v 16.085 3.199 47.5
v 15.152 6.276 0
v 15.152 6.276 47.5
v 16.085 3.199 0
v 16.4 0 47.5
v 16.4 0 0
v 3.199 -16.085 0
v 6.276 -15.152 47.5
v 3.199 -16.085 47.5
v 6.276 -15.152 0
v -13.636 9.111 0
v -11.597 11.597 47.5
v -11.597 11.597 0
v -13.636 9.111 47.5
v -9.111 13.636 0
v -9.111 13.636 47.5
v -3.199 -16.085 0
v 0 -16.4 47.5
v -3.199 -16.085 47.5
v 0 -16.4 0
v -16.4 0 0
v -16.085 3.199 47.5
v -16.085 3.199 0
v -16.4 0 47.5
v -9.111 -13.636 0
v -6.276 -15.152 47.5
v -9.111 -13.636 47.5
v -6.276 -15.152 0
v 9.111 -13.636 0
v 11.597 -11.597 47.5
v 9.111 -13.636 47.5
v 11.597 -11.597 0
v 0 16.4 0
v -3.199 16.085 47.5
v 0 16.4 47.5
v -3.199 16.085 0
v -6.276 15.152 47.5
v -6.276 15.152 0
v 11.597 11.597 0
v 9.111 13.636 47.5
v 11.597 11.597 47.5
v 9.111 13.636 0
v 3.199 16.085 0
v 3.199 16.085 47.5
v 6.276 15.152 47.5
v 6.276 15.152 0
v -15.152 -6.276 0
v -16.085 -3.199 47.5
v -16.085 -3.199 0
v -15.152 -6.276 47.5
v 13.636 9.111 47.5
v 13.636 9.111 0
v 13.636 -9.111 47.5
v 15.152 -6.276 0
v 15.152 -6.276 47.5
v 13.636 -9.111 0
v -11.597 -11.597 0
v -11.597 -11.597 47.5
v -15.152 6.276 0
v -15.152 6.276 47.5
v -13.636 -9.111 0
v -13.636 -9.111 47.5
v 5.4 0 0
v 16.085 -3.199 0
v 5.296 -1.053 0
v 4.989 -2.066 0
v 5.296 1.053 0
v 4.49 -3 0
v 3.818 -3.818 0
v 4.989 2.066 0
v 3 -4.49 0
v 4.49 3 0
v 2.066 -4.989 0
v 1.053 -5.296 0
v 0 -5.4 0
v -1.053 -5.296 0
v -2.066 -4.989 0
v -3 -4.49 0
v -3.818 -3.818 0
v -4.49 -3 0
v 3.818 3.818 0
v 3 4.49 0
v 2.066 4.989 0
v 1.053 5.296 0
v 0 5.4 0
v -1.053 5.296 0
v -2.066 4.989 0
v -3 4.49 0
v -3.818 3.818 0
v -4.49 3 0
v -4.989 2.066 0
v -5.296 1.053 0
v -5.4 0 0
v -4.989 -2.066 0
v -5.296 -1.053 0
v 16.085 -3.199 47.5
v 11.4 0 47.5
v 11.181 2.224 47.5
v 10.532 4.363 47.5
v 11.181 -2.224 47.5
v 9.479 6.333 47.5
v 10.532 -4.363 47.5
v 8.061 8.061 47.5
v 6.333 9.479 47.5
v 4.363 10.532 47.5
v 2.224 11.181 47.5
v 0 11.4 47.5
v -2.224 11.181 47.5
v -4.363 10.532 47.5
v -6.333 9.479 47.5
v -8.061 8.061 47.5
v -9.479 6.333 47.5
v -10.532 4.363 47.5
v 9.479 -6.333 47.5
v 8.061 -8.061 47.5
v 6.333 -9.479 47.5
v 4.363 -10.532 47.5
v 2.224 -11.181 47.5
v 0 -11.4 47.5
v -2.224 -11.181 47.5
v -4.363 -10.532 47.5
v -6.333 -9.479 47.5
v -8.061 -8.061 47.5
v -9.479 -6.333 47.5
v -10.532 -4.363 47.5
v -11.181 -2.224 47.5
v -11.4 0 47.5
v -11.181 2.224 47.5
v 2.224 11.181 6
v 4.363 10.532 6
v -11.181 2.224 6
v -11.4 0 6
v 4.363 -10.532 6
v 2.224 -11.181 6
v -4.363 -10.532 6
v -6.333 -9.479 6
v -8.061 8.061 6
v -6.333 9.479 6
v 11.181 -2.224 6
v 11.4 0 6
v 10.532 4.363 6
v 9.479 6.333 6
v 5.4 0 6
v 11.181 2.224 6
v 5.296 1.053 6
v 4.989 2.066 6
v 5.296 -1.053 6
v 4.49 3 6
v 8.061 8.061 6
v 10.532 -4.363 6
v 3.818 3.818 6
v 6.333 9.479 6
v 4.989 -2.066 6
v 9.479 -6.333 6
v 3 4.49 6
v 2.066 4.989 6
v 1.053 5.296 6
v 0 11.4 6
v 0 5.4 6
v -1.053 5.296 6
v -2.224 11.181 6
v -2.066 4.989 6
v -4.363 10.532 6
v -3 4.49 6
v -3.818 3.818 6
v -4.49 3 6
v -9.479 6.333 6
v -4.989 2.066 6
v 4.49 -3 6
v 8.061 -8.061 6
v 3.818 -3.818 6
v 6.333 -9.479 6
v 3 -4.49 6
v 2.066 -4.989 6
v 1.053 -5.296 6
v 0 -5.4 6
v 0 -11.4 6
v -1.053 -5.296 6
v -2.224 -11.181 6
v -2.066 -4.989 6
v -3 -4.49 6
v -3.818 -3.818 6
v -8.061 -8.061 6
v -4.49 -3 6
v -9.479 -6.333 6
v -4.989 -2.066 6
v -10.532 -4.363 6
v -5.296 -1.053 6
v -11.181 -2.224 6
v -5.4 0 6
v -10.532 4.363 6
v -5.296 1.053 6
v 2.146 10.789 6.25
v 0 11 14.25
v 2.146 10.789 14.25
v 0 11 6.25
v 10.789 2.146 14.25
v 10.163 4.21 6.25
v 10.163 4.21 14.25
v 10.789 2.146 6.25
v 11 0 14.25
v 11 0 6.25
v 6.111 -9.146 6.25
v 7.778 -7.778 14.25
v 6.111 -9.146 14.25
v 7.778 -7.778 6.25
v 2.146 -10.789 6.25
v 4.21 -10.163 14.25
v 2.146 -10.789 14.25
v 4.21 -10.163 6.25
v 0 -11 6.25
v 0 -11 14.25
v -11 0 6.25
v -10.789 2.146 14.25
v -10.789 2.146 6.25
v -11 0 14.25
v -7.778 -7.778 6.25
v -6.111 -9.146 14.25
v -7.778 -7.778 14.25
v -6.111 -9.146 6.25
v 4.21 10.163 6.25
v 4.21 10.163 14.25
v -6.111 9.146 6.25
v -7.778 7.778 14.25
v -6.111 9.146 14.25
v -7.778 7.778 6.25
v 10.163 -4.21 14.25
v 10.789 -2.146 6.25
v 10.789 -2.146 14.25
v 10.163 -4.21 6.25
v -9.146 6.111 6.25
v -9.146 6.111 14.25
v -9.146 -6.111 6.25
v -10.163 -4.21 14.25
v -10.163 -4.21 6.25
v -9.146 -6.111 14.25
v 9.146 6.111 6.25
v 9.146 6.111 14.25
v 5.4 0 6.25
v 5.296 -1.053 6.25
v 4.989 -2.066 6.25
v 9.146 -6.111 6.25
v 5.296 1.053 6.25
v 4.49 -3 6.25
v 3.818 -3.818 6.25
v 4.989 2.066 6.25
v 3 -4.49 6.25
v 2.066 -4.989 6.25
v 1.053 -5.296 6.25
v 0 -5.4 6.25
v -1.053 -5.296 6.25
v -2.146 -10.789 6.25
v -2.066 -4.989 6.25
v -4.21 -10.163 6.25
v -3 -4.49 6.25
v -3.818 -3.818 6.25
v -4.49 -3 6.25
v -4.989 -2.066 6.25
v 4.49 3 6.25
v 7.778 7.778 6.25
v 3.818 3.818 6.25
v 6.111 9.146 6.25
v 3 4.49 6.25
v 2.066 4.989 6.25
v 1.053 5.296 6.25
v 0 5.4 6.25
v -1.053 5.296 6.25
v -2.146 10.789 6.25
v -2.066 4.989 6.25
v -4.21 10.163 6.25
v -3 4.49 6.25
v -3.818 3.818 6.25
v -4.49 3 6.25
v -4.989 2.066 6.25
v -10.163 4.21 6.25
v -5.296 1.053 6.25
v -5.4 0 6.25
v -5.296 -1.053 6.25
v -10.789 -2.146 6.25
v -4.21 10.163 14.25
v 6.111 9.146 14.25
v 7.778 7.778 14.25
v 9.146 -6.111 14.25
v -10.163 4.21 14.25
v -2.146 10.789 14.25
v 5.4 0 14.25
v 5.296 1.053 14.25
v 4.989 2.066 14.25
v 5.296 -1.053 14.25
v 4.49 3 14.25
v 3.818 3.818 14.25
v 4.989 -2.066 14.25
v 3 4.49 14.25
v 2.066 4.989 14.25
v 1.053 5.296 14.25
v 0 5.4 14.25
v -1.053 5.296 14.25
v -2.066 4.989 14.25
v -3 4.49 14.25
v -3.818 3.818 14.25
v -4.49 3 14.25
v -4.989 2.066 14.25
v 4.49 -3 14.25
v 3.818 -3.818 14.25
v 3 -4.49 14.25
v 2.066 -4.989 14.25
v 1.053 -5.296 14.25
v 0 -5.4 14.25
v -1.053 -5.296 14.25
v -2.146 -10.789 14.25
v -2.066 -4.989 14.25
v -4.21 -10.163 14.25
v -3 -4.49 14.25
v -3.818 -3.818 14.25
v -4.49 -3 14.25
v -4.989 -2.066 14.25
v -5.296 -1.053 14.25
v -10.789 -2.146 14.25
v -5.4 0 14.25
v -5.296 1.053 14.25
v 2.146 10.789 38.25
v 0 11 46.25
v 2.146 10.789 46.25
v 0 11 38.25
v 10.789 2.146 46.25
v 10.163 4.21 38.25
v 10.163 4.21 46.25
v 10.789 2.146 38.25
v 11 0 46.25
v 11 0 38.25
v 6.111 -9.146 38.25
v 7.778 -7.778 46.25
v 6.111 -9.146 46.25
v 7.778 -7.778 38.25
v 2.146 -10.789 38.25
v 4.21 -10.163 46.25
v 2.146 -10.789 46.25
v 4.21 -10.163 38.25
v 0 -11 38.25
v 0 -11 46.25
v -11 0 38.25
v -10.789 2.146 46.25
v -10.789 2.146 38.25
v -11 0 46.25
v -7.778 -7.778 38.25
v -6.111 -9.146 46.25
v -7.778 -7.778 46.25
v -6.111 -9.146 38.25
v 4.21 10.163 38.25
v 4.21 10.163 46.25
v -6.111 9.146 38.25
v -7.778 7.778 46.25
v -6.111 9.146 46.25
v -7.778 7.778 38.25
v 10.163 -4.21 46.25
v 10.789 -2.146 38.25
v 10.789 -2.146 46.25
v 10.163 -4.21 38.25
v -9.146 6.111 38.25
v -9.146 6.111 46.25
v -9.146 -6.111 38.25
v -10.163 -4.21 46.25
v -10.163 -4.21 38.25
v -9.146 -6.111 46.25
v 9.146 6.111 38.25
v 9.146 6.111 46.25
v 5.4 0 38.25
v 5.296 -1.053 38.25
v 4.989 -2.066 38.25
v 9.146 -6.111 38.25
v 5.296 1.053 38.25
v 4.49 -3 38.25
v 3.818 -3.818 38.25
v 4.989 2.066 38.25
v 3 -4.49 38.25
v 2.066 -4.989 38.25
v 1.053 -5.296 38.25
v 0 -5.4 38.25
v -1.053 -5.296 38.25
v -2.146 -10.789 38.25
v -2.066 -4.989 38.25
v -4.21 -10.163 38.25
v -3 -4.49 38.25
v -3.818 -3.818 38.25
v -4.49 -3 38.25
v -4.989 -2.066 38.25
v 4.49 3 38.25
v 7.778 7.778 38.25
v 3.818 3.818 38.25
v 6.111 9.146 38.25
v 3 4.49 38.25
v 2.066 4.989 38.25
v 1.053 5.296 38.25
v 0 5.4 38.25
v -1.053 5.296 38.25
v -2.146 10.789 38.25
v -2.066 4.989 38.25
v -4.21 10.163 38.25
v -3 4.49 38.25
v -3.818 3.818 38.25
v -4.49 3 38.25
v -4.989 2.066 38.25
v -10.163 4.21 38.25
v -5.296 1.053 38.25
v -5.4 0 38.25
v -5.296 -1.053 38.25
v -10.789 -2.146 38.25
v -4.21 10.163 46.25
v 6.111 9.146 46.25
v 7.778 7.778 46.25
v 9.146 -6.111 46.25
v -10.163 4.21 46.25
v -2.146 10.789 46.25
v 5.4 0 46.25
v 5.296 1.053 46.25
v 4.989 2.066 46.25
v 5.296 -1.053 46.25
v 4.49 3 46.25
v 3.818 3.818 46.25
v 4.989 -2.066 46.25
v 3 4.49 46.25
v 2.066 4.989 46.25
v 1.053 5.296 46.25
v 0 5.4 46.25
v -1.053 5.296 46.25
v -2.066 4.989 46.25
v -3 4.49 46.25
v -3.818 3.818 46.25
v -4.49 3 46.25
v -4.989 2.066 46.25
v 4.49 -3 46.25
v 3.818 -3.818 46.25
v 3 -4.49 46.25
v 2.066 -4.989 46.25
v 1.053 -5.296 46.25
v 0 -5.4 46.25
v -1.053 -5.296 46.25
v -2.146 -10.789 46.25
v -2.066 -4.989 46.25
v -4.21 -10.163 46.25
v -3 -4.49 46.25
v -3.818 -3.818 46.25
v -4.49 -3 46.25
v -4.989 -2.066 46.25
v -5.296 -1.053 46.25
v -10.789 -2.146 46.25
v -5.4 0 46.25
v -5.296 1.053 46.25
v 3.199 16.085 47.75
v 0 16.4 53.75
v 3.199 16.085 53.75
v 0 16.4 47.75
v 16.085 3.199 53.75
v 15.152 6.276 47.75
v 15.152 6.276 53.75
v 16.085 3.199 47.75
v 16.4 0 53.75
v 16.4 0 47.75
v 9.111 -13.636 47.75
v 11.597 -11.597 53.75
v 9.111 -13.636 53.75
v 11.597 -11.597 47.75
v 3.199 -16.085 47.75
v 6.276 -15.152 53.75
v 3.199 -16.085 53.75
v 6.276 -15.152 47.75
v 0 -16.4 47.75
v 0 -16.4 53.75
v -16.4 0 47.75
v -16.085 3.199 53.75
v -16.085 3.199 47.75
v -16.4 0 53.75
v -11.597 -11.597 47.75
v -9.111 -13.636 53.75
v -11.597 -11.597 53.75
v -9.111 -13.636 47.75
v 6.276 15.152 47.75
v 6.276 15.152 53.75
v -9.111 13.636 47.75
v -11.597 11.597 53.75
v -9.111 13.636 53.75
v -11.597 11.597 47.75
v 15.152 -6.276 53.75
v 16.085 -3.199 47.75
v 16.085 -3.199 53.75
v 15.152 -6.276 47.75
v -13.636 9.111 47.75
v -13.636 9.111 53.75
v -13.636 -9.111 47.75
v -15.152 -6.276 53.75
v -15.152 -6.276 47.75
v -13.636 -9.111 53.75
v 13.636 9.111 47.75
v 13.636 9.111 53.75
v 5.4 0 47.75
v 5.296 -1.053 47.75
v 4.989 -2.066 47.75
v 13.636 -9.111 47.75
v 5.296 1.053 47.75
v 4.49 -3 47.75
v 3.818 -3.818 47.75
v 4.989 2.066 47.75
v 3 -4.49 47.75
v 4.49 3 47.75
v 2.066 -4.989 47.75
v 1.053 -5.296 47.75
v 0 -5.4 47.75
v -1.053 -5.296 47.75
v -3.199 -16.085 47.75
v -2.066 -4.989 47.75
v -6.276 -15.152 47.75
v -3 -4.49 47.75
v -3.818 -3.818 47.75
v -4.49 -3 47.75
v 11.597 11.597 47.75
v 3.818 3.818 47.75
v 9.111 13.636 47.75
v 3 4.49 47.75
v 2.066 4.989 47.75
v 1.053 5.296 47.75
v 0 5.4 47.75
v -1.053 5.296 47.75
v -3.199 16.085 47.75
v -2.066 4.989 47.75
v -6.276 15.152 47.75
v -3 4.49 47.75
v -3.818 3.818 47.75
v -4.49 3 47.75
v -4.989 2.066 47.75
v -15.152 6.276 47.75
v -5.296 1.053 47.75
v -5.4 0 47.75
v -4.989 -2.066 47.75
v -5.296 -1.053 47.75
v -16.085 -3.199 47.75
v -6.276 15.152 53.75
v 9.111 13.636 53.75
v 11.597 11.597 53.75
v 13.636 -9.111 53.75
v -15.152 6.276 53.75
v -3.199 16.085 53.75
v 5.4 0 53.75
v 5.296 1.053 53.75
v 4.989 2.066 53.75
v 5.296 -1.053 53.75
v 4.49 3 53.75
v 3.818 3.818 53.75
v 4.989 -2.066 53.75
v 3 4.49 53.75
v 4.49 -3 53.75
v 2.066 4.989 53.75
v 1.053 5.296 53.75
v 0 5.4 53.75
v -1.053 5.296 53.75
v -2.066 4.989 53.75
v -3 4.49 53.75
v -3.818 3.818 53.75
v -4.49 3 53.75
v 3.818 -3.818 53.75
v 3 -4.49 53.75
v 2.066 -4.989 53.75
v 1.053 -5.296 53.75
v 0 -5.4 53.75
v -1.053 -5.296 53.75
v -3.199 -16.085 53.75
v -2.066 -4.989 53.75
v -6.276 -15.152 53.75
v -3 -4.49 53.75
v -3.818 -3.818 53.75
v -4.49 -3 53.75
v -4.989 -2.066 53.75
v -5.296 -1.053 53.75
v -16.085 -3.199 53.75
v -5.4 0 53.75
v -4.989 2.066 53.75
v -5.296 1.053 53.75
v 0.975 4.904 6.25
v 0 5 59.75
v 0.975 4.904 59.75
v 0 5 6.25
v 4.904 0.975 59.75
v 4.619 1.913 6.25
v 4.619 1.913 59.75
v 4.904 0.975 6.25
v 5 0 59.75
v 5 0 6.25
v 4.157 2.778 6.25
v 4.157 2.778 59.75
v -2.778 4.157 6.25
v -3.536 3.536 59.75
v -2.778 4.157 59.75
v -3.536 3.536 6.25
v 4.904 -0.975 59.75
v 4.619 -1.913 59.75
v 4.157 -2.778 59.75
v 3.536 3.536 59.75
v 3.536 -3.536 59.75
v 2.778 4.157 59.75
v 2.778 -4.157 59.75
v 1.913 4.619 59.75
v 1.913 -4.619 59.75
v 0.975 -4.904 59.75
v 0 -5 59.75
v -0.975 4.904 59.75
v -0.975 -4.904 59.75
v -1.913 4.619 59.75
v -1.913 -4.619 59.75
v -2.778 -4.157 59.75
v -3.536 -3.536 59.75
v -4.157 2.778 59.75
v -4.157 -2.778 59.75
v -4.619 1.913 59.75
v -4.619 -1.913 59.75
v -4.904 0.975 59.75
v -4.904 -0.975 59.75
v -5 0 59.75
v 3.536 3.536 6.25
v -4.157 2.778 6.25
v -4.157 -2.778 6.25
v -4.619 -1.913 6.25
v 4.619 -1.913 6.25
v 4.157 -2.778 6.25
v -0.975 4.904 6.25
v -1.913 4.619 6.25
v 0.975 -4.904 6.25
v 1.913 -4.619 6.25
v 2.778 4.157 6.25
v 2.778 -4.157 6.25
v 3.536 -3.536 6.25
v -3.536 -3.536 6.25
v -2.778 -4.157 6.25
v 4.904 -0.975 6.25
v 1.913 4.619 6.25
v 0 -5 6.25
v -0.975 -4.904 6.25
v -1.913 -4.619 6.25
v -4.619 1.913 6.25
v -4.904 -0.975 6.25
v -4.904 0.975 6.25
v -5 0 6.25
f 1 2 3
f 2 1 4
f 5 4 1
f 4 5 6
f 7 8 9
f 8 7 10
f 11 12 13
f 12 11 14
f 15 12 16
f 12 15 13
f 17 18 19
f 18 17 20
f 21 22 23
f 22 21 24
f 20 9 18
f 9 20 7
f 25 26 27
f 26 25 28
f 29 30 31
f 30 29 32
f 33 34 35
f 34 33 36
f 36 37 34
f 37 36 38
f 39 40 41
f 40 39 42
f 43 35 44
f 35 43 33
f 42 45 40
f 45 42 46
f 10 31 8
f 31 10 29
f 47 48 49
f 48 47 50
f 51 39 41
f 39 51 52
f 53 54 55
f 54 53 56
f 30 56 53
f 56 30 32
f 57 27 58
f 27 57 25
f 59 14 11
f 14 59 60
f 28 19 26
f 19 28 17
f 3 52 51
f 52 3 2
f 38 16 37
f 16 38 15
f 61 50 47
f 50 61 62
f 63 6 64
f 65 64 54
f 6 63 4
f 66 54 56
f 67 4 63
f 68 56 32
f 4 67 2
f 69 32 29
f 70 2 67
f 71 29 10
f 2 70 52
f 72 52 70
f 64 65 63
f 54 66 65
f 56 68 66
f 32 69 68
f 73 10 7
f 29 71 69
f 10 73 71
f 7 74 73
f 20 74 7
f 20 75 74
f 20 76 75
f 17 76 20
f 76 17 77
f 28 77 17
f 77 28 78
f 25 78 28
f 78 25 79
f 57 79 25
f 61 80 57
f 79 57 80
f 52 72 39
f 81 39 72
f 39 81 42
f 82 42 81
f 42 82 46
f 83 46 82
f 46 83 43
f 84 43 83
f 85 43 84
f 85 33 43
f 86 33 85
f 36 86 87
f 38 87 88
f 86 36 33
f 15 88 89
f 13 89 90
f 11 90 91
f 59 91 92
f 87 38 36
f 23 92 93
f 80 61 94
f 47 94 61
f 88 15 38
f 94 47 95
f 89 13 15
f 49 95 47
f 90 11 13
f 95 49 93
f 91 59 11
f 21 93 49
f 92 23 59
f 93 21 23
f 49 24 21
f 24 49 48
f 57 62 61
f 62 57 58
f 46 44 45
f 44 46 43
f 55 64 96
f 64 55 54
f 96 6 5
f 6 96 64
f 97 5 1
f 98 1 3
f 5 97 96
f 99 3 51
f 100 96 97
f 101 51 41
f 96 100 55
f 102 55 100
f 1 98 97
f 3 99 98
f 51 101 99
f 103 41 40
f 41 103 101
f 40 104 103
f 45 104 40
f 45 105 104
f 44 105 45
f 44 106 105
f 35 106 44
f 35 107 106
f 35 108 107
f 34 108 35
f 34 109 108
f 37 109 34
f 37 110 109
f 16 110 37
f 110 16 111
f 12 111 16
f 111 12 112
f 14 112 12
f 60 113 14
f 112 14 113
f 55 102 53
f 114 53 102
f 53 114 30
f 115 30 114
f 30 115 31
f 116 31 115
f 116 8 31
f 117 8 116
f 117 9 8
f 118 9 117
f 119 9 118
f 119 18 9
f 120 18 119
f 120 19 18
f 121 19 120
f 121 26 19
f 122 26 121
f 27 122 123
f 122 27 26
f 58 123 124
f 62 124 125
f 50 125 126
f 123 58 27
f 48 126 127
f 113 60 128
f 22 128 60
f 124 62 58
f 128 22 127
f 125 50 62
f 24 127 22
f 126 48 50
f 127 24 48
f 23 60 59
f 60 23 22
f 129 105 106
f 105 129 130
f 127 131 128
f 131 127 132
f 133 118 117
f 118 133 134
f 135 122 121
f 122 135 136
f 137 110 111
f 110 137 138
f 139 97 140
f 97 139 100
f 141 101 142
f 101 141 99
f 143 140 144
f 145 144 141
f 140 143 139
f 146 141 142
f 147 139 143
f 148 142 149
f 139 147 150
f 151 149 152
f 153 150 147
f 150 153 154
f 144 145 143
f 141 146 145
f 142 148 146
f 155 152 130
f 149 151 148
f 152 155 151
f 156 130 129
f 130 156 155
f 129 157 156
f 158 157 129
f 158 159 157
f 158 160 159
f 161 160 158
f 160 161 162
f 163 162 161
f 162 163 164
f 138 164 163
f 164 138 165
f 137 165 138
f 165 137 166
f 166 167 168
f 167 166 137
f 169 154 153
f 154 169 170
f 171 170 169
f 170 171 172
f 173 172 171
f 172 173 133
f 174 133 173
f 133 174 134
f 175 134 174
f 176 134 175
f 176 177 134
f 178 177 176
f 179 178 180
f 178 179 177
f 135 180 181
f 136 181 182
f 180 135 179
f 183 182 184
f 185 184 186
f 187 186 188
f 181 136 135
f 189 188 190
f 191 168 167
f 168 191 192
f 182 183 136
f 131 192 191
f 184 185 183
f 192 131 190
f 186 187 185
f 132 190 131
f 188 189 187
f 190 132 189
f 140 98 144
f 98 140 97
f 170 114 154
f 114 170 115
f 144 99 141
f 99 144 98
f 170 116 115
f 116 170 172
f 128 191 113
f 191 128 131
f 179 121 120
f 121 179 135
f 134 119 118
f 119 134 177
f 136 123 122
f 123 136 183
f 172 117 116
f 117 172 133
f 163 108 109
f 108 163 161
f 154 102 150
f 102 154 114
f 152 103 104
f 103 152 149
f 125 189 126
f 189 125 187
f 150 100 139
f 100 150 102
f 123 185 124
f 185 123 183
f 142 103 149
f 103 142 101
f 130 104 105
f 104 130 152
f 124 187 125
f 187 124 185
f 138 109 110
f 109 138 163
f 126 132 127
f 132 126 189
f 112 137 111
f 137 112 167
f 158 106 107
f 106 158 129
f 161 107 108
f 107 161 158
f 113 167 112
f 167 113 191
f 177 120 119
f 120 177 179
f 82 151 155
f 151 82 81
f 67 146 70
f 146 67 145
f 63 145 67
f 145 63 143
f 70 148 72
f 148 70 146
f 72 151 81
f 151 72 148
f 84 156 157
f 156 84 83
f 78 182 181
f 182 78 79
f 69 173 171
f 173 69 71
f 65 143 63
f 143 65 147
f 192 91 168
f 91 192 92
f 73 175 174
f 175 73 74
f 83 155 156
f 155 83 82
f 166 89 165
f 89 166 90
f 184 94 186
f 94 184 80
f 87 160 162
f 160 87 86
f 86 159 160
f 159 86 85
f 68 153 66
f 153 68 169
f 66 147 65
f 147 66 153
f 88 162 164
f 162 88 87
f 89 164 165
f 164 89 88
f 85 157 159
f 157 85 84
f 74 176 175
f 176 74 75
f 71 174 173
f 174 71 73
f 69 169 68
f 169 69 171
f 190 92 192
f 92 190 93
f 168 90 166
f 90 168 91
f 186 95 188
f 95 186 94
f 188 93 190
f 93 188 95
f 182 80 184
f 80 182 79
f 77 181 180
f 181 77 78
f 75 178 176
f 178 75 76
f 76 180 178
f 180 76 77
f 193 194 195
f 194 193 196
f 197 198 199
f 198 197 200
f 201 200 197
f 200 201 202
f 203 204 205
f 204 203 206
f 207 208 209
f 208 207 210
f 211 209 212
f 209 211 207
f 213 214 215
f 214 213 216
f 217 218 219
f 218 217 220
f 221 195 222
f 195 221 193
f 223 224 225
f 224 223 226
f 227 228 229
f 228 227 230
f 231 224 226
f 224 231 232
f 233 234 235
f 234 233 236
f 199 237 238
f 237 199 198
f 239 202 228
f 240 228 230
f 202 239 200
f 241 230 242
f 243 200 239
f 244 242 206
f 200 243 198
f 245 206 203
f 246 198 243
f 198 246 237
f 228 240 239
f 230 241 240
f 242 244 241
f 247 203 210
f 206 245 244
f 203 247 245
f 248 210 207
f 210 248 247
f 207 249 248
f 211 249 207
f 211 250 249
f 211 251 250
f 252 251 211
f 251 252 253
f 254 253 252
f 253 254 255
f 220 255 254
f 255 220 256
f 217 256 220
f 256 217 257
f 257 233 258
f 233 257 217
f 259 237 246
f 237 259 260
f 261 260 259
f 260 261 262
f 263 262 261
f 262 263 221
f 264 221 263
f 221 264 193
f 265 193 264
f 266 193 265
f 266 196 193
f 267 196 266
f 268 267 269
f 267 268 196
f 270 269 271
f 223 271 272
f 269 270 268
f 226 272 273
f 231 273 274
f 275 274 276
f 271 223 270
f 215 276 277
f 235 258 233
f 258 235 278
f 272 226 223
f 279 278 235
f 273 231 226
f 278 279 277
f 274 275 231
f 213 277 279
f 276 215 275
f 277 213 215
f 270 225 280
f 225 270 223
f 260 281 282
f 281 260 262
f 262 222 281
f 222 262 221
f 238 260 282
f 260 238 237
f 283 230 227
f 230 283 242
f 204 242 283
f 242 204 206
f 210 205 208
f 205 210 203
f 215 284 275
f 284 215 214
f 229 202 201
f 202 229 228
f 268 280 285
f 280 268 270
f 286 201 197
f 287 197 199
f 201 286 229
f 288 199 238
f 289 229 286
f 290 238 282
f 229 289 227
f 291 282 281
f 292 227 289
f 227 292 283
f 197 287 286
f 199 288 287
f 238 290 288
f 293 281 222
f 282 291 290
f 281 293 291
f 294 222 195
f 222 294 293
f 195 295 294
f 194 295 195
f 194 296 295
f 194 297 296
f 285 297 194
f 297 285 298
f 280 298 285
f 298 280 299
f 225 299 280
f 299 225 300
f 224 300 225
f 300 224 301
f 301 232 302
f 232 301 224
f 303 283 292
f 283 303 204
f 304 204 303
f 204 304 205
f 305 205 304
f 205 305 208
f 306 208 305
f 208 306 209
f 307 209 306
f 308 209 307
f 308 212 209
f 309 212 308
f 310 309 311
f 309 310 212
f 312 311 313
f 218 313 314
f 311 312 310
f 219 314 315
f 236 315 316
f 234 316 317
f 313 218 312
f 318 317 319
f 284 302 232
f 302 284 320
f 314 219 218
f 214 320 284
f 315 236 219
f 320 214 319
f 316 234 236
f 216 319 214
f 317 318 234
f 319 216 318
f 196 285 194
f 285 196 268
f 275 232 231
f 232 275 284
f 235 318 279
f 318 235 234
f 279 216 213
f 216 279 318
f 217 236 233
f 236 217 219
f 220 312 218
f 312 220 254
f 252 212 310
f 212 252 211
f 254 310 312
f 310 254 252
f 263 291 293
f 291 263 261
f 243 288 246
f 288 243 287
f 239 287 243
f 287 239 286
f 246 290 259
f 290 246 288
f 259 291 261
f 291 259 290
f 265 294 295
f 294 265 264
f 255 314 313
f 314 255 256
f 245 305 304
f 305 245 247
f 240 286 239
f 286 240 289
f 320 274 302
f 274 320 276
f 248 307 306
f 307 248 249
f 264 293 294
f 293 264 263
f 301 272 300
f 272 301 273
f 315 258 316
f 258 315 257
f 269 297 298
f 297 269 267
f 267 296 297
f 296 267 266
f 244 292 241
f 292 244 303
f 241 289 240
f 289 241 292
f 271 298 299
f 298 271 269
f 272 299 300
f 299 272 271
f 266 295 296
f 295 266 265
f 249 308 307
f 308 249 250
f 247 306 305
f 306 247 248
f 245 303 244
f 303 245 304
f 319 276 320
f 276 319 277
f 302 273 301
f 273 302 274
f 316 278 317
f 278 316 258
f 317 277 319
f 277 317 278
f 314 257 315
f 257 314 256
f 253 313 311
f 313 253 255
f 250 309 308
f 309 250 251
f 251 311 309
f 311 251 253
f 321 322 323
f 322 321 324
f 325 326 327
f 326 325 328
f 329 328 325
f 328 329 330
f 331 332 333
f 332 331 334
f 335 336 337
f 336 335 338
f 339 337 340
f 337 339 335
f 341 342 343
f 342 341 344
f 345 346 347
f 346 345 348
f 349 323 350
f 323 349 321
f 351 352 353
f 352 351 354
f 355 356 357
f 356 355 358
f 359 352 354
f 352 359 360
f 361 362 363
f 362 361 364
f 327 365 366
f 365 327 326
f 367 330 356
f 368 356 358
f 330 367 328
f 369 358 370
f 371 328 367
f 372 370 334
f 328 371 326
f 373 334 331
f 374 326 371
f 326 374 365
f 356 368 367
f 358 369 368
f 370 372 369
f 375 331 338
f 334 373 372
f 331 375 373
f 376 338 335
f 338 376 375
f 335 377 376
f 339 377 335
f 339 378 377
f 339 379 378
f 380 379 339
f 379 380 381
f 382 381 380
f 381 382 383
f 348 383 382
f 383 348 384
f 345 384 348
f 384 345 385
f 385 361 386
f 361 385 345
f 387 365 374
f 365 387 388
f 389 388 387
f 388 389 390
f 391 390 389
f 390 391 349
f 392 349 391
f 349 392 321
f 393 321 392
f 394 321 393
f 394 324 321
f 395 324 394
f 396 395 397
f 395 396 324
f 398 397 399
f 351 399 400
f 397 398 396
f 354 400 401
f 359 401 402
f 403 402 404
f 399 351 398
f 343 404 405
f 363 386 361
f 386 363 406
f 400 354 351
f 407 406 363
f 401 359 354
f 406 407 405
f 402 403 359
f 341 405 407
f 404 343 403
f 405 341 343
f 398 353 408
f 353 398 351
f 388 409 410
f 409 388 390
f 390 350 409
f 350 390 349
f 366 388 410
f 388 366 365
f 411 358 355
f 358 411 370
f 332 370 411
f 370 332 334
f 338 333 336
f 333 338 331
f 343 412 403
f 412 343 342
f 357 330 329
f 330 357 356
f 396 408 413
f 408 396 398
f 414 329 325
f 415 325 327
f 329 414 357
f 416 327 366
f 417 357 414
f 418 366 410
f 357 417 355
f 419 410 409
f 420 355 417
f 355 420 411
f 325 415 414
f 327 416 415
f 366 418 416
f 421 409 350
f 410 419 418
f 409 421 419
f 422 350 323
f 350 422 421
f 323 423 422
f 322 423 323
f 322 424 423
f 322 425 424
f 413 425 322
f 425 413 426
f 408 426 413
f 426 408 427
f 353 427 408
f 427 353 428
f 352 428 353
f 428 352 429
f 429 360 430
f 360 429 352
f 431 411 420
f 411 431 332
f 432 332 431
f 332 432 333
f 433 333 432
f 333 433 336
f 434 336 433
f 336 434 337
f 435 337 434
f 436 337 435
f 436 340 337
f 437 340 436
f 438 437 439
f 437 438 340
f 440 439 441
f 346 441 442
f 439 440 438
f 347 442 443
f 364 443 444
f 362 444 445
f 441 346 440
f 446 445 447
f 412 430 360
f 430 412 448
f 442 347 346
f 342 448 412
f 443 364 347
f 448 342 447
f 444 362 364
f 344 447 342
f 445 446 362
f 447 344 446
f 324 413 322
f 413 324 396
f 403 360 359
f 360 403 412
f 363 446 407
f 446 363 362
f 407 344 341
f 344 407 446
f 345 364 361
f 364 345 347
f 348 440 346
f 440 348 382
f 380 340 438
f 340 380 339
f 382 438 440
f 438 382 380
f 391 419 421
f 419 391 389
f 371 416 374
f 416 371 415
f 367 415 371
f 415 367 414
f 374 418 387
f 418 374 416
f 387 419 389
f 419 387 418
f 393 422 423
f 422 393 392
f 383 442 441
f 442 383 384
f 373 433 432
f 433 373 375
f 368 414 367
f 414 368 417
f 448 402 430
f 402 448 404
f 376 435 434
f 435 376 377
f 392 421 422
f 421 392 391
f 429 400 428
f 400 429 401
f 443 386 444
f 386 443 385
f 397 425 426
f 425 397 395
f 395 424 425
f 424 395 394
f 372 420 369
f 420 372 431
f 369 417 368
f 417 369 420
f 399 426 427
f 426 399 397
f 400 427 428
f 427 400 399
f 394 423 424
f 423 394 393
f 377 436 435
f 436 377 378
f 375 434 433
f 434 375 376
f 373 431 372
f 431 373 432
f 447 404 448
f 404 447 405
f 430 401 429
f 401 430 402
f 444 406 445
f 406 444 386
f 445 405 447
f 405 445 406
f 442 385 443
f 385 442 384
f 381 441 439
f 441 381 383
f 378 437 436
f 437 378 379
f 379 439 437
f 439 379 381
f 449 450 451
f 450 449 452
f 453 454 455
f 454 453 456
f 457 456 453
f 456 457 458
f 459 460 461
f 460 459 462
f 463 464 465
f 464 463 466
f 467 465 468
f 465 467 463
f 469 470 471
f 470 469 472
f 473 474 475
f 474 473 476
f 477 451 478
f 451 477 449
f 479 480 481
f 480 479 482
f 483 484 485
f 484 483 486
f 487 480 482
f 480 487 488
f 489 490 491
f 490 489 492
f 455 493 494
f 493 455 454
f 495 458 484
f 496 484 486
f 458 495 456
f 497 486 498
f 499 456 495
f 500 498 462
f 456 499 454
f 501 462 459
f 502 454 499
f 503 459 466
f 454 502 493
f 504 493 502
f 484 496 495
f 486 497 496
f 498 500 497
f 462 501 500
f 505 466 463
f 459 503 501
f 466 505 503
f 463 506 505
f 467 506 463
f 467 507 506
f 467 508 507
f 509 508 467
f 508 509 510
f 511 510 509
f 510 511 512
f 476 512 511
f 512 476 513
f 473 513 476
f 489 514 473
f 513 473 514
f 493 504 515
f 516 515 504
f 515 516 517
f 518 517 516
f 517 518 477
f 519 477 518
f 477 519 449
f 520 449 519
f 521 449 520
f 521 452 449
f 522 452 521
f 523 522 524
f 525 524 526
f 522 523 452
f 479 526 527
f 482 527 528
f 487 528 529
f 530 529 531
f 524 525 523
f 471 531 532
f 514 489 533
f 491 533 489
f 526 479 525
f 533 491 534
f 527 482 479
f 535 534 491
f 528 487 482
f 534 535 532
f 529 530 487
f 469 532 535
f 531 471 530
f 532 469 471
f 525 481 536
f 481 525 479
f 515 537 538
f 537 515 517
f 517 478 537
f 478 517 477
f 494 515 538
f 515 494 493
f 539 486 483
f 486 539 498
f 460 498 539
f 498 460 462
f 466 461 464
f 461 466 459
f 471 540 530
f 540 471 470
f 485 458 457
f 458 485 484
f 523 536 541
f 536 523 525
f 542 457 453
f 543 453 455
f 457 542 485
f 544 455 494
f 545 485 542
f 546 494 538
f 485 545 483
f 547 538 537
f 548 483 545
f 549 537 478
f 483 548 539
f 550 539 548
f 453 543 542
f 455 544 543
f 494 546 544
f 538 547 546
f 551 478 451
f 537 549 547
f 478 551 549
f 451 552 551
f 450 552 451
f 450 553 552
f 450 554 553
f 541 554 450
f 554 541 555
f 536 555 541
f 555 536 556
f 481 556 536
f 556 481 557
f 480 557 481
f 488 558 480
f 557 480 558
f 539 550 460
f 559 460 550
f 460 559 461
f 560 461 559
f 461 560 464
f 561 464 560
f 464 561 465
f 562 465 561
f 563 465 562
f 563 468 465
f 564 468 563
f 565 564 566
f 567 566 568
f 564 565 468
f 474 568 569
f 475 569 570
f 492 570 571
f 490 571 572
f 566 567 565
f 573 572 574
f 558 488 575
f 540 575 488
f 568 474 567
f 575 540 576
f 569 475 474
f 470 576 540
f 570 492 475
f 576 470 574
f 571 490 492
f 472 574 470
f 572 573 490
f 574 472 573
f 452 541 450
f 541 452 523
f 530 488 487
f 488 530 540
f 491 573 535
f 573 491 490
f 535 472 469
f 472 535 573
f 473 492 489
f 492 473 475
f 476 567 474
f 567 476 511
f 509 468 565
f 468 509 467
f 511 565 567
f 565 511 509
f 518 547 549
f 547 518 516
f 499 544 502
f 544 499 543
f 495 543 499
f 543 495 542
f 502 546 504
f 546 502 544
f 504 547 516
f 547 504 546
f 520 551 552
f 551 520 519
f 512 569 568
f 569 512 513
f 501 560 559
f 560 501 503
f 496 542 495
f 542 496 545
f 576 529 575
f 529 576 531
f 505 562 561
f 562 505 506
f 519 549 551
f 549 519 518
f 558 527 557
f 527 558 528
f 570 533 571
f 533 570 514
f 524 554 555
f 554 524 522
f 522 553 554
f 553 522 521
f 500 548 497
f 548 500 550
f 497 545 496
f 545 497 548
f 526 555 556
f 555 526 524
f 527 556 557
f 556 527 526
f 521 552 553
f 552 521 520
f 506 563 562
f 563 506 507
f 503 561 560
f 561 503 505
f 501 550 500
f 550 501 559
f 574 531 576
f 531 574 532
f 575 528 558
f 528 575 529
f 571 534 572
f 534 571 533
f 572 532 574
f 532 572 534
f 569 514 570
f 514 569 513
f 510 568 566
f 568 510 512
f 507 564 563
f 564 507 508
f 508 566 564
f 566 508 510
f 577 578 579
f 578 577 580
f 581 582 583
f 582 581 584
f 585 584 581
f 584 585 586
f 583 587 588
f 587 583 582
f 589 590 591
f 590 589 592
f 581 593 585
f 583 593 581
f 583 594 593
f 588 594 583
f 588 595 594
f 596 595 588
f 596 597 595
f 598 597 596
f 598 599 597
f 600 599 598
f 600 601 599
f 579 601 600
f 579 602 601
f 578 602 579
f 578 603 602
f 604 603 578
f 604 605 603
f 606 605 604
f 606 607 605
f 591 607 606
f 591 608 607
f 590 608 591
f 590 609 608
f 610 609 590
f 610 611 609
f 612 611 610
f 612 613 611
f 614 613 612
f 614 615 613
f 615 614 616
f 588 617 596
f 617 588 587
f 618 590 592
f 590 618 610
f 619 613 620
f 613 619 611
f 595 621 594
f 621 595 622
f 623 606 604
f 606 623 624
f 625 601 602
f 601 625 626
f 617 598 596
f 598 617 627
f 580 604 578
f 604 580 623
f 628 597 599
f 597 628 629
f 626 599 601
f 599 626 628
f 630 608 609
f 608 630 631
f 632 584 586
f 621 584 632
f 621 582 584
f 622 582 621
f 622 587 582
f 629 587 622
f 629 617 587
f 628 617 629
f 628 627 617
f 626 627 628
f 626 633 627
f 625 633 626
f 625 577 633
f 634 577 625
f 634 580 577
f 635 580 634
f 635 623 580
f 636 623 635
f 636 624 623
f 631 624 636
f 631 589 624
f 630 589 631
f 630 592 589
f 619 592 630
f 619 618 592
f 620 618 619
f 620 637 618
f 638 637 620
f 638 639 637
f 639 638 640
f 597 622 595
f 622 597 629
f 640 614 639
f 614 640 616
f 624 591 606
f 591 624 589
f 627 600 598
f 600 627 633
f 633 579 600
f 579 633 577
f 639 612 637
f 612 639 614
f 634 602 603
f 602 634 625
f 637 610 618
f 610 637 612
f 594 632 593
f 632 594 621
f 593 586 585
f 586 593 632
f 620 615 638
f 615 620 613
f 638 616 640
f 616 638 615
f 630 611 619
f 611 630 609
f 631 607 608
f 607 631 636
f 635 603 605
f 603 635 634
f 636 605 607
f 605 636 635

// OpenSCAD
$fn = 32;

// ------------------------------------------------------------------------
// Shaft station: cup d32.8 x 47.5 mm, shaft d10
// Every part is its own module, assembly() places every instance.
// ------------------------------------------------------------------------

// --- part 1 ---
module housing_cup() {
  difference() {
    cylinder(h = 47.5, d = 32.8);
    translate([0, 0, 6]) cylinder(h = 42.5, d = 22.8);
    translate([0, 0, -1]) cylinder(h = 8, d = 10.8);
  }
}

// --- part 2 ---
module bearing_lower() {
  difference() {
      translate([0, 0, 0]) cylinder(h = 8, d = 22);
      translate([0, 0, -1]) cylinder(h = 10, d = 10.8);
    }
}

// --- part 3 ---
module bearing_upper() {
  difference() {
      translate([0, 0, 0]) cylinder(h = 8, d = 22);
      translate([0, 0, -1]) cylinder(h = 10, d = 10.8);
    }
}

// --- part 4 ---
module station_shaft() {
  translate([0, 0, -26.75]) cylinder(h = 53.5, d = 10);
}

// --- part 5 ---
module station_cover() {
  difference() {
    cylinder(h = 6, d = 32.8);
    translate([0, 0, -1]) cylinder(h = 8, d = 10.8);
  }
}

// --- assembly ---
module assembly() {
  color([0.80, 0.24, 0.20]) translate([0, 0, 0]) rotate([0, 0, 0]) housing_cup();
  color([0.20, 0.45, 0.75]) translate([0, 0, 6.25]) rotate([0, 0, 0]) bearing_lower();
  color([0.25, 0.62, 0.32]) translate([0, 0, 38.25]) rotate([0, 0, 0]) bearing_upper();
  color([0.92, 0.70, 0.18]) translate([0, 0, 33]) rotate([0, 0, 0]) station_shaft();
  color([0.58, 0.35, 0.70]) translate([0, 0, 47.75]) rotate([0, 0, 0]) station_cover();
}

assembly();
